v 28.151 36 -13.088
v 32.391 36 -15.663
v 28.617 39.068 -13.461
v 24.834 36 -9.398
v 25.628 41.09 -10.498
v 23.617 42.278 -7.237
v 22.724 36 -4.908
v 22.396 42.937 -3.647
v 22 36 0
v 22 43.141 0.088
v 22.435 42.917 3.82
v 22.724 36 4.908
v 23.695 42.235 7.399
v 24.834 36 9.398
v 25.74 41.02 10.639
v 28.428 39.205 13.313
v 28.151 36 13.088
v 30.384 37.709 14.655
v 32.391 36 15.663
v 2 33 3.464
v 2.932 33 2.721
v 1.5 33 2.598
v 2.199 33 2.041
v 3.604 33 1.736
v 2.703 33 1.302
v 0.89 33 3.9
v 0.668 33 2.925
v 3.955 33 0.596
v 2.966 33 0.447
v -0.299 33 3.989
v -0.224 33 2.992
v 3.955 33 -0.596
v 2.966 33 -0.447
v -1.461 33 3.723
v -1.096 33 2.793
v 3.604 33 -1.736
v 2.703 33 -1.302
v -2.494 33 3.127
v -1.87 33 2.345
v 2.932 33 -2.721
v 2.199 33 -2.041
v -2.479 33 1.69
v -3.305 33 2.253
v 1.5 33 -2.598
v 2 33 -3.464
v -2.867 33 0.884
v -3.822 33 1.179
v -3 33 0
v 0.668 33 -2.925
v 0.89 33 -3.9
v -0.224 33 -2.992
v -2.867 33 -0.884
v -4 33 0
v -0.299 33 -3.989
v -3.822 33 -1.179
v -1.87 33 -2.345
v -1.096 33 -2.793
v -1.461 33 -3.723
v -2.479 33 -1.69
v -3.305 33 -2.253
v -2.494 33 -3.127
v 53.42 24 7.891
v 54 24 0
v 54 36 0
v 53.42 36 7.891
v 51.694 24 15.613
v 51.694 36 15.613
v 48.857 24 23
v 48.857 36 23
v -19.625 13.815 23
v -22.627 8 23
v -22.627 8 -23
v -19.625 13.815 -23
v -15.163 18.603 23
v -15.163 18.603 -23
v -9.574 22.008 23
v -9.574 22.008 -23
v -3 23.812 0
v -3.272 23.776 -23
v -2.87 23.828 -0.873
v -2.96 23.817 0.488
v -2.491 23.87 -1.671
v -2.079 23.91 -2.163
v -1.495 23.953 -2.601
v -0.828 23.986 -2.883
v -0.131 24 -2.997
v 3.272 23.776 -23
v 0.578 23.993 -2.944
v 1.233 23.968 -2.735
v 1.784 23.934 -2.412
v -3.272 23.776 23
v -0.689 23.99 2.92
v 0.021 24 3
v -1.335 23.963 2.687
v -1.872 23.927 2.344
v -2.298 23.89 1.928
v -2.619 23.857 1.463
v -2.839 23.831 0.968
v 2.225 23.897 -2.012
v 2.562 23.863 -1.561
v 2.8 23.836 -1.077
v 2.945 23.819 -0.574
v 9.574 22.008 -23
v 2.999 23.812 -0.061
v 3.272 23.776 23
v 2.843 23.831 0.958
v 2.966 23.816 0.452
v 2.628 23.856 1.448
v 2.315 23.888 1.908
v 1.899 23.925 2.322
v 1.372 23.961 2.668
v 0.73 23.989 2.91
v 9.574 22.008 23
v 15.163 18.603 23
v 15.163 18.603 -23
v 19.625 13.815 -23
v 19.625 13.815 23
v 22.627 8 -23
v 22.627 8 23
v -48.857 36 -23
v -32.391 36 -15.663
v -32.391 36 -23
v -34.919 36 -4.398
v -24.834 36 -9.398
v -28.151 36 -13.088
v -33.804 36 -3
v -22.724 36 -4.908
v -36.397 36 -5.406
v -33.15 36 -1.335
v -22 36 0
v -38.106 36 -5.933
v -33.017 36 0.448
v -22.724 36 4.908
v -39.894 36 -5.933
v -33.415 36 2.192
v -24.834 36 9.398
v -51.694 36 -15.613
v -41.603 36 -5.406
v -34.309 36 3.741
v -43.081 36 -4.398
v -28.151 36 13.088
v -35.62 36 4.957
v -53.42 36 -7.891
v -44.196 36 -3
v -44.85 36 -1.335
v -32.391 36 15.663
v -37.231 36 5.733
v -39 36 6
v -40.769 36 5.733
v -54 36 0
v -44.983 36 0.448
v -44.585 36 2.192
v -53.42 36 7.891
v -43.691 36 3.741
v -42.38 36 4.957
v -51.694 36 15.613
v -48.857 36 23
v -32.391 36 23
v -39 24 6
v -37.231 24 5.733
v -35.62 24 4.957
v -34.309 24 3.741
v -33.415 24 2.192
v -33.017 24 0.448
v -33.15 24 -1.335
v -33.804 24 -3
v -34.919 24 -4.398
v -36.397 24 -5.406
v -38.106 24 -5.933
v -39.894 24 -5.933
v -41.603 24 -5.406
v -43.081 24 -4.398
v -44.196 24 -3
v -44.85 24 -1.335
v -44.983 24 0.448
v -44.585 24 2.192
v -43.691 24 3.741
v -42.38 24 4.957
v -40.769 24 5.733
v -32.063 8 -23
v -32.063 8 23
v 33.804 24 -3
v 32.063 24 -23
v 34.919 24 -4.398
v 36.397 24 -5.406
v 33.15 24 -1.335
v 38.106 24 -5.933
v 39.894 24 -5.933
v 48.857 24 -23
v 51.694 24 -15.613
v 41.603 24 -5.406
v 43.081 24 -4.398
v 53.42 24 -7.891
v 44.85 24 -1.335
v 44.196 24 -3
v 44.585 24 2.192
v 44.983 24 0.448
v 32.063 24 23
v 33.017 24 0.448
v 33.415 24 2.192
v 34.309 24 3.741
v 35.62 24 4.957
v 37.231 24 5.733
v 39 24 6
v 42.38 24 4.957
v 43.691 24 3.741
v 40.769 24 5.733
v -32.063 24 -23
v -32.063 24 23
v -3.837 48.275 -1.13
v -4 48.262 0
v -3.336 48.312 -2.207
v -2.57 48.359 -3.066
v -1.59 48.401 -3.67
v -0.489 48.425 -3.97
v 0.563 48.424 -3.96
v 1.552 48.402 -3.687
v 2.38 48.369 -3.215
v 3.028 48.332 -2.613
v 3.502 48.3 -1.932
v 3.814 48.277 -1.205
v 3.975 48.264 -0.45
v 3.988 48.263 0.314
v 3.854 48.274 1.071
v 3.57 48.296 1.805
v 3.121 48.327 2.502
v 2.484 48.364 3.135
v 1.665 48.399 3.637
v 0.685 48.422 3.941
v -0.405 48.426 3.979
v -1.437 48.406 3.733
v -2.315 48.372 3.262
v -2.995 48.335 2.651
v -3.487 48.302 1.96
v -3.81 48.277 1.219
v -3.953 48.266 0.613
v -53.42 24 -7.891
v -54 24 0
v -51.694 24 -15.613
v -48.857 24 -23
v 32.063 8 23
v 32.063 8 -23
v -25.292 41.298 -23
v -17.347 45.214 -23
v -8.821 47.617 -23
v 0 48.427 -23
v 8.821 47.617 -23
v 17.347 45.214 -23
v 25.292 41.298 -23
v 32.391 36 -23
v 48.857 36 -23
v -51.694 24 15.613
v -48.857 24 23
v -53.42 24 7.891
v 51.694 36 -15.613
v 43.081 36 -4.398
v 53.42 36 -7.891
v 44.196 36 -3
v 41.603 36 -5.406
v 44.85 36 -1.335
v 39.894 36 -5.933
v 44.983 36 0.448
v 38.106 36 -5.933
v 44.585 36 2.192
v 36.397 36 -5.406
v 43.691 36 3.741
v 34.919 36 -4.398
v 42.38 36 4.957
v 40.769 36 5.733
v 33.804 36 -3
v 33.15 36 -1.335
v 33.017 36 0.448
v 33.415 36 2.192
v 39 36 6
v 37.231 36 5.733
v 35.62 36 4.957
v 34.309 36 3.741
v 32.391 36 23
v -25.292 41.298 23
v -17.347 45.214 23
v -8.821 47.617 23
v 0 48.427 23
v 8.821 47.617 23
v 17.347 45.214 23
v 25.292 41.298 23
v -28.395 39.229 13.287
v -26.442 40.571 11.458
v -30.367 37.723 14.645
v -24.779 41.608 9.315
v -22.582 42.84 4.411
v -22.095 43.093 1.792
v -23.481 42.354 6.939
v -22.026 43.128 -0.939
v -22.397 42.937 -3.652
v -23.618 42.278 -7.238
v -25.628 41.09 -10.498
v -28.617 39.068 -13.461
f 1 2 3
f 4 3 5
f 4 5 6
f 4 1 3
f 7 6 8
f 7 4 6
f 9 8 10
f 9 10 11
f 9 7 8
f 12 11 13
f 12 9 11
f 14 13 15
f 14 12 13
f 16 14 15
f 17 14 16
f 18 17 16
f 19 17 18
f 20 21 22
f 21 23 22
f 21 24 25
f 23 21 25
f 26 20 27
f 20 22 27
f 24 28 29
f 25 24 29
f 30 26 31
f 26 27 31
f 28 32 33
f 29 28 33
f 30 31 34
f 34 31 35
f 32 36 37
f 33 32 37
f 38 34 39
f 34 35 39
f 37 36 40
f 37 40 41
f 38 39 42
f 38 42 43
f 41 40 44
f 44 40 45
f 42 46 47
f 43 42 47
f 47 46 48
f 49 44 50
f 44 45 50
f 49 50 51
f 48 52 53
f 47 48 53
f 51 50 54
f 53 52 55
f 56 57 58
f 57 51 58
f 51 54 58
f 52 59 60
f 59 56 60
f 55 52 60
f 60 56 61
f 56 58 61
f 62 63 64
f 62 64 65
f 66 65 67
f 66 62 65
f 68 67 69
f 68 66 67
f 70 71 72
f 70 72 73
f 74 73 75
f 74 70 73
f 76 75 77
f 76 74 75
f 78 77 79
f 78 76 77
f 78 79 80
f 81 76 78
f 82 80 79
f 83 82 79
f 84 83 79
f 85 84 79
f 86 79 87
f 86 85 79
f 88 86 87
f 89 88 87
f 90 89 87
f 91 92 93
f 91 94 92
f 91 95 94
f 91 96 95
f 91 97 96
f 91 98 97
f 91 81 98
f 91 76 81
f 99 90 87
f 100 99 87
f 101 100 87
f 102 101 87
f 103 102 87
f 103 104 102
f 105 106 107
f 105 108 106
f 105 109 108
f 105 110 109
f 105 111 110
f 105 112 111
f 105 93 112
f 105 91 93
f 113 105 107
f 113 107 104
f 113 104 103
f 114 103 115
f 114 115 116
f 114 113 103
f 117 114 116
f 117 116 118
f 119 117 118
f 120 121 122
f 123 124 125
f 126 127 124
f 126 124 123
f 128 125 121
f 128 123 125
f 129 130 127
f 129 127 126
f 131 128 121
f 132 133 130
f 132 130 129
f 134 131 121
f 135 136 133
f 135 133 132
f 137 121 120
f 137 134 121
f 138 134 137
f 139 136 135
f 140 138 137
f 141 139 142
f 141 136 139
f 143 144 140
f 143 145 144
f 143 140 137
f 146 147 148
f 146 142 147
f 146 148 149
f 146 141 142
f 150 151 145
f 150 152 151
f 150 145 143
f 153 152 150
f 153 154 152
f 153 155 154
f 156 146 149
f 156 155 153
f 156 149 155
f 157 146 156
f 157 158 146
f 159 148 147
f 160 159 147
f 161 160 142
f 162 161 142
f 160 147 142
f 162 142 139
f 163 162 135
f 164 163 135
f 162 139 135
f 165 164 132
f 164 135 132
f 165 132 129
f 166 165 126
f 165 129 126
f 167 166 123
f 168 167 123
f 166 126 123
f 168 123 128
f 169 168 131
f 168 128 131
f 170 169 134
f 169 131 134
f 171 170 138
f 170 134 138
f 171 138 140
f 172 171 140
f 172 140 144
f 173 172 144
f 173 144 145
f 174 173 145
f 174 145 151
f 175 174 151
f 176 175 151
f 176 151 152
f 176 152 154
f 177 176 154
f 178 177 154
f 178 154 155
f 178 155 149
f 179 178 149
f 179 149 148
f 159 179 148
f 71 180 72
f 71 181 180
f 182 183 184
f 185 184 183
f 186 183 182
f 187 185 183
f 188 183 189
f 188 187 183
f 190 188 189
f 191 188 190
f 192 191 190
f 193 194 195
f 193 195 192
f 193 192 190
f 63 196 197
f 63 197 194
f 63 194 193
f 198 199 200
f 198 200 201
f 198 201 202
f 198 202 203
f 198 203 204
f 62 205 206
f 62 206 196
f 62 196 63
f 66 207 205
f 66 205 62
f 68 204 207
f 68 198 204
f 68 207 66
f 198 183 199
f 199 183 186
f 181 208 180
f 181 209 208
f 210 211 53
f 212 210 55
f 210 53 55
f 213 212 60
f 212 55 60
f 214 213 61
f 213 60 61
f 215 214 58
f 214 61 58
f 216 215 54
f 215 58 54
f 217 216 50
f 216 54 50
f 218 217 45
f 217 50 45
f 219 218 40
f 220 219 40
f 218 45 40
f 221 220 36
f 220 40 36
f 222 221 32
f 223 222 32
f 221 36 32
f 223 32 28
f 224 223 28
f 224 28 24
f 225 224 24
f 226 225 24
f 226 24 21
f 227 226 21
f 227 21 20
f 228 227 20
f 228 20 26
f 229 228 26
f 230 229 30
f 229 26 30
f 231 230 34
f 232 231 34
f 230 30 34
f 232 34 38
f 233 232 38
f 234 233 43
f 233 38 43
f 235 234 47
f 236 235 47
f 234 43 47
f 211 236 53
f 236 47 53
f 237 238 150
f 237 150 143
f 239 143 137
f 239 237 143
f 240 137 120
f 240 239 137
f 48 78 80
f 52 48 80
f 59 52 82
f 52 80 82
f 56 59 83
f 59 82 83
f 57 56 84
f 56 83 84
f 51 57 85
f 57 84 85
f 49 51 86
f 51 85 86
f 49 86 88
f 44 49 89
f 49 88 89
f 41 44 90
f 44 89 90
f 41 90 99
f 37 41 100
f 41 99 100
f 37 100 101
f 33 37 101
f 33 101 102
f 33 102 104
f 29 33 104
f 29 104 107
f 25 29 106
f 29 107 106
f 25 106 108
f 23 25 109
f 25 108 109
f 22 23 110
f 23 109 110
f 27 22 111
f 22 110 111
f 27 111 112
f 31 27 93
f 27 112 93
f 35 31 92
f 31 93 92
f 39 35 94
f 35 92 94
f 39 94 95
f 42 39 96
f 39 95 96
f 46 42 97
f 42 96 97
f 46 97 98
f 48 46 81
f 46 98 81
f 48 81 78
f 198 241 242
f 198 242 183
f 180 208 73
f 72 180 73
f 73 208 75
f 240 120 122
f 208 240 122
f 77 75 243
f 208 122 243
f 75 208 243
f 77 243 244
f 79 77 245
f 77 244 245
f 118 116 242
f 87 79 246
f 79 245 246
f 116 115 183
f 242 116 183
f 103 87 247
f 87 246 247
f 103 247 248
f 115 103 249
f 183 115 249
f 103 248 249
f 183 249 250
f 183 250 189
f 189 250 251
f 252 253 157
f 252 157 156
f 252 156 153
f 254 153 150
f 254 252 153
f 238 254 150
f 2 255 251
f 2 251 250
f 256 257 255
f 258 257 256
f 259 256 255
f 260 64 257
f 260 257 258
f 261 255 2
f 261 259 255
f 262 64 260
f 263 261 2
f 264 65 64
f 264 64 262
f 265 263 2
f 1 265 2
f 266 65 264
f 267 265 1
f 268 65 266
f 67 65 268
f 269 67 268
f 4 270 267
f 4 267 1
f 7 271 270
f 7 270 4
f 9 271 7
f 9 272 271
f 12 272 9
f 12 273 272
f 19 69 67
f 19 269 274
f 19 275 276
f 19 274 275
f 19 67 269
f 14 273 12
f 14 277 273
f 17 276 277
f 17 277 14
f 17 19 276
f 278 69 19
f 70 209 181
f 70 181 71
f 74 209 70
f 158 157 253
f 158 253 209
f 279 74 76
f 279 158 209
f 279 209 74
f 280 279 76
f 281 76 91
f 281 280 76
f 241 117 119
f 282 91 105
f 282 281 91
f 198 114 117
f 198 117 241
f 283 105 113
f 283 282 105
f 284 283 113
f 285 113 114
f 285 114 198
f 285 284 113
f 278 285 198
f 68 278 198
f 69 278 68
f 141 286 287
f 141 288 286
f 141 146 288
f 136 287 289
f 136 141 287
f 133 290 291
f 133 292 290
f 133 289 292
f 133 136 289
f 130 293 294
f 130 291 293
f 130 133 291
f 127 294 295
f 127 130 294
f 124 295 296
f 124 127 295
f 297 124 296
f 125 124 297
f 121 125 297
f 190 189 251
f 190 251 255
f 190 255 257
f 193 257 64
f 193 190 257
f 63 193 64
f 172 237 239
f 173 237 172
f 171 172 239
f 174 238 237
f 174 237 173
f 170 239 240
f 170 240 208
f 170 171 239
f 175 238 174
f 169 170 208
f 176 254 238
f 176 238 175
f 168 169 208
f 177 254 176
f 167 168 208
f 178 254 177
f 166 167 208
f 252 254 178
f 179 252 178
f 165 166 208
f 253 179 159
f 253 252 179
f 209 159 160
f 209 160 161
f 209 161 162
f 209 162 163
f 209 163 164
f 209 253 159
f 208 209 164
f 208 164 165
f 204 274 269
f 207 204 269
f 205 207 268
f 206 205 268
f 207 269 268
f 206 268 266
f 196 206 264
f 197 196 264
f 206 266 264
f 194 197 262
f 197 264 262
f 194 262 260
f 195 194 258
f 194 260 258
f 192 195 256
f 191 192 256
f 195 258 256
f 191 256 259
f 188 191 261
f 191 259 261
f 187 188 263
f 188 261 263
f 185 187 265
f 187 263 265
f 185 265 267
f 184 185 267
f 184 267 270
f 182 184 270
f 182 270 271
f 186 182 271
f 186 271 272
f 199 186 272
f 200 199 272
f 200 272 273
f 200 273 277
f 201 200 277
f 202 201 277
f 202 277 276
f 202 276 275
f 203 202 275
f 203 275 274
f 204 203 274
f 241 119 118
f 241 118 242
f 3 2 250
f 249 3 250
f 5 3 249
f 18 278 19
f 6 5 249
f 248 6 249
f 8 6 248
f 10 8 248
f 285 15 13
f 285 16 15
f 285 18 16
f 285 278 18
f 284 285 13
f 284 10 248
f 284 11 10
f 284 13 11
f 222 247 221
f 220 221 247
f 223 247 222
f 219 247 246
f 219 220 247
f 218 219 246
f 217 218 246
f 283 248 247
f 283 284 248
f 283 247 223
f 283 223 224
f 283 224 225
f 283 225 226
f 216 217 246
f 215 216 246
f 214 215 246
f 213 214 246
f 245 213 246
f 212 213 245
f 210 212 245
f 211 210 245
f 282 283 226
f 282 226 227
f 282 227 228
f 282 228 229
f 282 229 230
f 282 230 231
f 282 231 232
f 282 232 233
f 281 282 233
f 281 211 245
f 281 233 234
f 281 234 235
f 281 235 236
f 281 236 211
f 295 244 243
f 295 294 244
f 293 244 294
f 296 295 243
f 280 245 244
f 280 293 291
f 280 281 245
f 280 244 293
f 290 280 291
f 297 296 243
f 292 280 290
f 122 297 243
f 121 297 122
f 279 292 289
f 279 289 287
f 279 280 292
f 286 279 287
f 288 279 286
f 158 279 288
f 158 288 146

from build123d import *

# Parameters (mm, degrees)
BOSS_EXTRUDE1_DEPTH = 23
SKETCH2_R           = 17
CUT_EXTRUDE1_DEPTH  = 66.030761952
SKETCH3_R           = 6
CUT_EXTRUDE2_DEPTH  = 66.030761987
CUT_EXTRUDE3_START  = -12
CUT_EXTRUDE3_DEPTH  = 12


# Read off the part's stored shape, not the designer's step: Cut-Extrude3
with BuildPart() as part:
    # Sketch1 → Boss-Extrude1 (new, symmetric)
    with BuildSketch(Plane.XY):
        with BuildLine():
            Line((-32.062618722, 8), (-22.627416998, 8))
            ThreePointArc((-22.627416998, 8), (0, 24), (22.627416998, 8))
            Line((22.627416998, 8), (32.062618722, 8))
            Line((32.062618722, 8), (32.062618722, 24))
            Line((32.062618722, 24), (54, 24))
            Line((54, 24), (54, 36))
            Line((54, 36), (32.391338275, 36))
            ThreePointArc((32.391338275, 36), (0, 48.427252609), (-32.391338275, 36))
            Line((-32.391338275, 36), (-54, 36))
            Line((-54, 36), (-54, 24))
            Line((-54, 24), (-32.062618722, 24))
            Line((-32.062618722, 24), (-32.062618722, 8))
        make_face()
    extrude(amount=BOSS_EXTRUDE1_DEPTH, both=True)

    # Sketch2 → Cut-Extrude1 (cut, through all)
    with BuildSketch(Plane(origin=(0, 36, 0), x_dir=(1, 0, 0), z_dir=(0, 1, 0))):
        with Locations((-39, 0)):
            Circle(SKETCH2_R)
        with Locations((39, 0)):
            Circle(SKETCH2_R)
    extrude(amount=CUT_EXTRUDE1_DEPTH, mode=Mode.SUBTRACT)

    # Sketch3 → Cut-Extrude2 (cut, through all)
    with BuildSketch(Plane(origin=(0, 36, 0), x_dir=(1, 0, 0), z_dir=(0, 1, 0))):
        with Locations(Location((-39, 0, 0), (0, 0, 270))):
            Circle(SKETCH3_R)
        with Locations(Location((39, 0, 0), (0, 0, 270))):
            Circle(SKETCH3_R)
    extrude(amount=-CUT_EXTRUDE2_DEPTH, mode=Mode.SUBTRACT)

    # Sketch4 → Cut-Revolve1 (revolve, cut)
    with BuildSketch(Plane.XY, mode=Mode.PRIVATE) as cut_revolve1_sk:
        Polygon((0, 50), (4, 50), (4, 33), (3, 33), (3, 20), (0, 20), align=None)
    revolve(cut_revolve1_sk.sketch.rotate(Axis((0, 50, 0), (0, -1, 0)), 180), axis=Axis((0, 50, 0), (0, -1, 0)), mode=Mode.SUBTRACT)

    # Cut-Extrude3 outline → Cut-Extrude3 (cut)
    with BuildSketch(Plane(origin=(0, 36, 0), x_dir=(1, 0, 0), z_dir=(0, 1, 0)).offset(CUT_EXTRUDE3_START)):
        with BuildLine():
            ThreePointArc((-54, 0), (-52.698550436, 11.784005345), (-48.856934001, 23))
            Line((-48.856934001, 23), (-54, 23))
            Line((-54, 23), (-54, 0))
        make_face()
        with BuildLine():
            ThreePointArc((-48.856934001, -23), (-52.698550436, -11.784005345), (-54, 0))
            Line((-54, 0), (-54, -23))
            Line((-54, -23), (-48.856934001, -23))
        make_face()
        with BuildLine():
            Line((54, 23), (48.856934001, 23))
            ThreePointArc((48.856934001, 23), (52.698550436, 11.784005345), (54, 0))
            Line((54, 0), (54, 23))
        make_face()
        with BuildLine():
            Line((54, -23), (54, 0))
            ThreePointArc((54, 0), (52.698550436, -11.784005345), (48.856934001, -23))
            Line((48.856934001, -23), (54, -23))
        make_face()
    extrude(amount=CUT_EXTRUDE3_DEPTH, mode=Mode.SUBTRACT)


solid = part.part
